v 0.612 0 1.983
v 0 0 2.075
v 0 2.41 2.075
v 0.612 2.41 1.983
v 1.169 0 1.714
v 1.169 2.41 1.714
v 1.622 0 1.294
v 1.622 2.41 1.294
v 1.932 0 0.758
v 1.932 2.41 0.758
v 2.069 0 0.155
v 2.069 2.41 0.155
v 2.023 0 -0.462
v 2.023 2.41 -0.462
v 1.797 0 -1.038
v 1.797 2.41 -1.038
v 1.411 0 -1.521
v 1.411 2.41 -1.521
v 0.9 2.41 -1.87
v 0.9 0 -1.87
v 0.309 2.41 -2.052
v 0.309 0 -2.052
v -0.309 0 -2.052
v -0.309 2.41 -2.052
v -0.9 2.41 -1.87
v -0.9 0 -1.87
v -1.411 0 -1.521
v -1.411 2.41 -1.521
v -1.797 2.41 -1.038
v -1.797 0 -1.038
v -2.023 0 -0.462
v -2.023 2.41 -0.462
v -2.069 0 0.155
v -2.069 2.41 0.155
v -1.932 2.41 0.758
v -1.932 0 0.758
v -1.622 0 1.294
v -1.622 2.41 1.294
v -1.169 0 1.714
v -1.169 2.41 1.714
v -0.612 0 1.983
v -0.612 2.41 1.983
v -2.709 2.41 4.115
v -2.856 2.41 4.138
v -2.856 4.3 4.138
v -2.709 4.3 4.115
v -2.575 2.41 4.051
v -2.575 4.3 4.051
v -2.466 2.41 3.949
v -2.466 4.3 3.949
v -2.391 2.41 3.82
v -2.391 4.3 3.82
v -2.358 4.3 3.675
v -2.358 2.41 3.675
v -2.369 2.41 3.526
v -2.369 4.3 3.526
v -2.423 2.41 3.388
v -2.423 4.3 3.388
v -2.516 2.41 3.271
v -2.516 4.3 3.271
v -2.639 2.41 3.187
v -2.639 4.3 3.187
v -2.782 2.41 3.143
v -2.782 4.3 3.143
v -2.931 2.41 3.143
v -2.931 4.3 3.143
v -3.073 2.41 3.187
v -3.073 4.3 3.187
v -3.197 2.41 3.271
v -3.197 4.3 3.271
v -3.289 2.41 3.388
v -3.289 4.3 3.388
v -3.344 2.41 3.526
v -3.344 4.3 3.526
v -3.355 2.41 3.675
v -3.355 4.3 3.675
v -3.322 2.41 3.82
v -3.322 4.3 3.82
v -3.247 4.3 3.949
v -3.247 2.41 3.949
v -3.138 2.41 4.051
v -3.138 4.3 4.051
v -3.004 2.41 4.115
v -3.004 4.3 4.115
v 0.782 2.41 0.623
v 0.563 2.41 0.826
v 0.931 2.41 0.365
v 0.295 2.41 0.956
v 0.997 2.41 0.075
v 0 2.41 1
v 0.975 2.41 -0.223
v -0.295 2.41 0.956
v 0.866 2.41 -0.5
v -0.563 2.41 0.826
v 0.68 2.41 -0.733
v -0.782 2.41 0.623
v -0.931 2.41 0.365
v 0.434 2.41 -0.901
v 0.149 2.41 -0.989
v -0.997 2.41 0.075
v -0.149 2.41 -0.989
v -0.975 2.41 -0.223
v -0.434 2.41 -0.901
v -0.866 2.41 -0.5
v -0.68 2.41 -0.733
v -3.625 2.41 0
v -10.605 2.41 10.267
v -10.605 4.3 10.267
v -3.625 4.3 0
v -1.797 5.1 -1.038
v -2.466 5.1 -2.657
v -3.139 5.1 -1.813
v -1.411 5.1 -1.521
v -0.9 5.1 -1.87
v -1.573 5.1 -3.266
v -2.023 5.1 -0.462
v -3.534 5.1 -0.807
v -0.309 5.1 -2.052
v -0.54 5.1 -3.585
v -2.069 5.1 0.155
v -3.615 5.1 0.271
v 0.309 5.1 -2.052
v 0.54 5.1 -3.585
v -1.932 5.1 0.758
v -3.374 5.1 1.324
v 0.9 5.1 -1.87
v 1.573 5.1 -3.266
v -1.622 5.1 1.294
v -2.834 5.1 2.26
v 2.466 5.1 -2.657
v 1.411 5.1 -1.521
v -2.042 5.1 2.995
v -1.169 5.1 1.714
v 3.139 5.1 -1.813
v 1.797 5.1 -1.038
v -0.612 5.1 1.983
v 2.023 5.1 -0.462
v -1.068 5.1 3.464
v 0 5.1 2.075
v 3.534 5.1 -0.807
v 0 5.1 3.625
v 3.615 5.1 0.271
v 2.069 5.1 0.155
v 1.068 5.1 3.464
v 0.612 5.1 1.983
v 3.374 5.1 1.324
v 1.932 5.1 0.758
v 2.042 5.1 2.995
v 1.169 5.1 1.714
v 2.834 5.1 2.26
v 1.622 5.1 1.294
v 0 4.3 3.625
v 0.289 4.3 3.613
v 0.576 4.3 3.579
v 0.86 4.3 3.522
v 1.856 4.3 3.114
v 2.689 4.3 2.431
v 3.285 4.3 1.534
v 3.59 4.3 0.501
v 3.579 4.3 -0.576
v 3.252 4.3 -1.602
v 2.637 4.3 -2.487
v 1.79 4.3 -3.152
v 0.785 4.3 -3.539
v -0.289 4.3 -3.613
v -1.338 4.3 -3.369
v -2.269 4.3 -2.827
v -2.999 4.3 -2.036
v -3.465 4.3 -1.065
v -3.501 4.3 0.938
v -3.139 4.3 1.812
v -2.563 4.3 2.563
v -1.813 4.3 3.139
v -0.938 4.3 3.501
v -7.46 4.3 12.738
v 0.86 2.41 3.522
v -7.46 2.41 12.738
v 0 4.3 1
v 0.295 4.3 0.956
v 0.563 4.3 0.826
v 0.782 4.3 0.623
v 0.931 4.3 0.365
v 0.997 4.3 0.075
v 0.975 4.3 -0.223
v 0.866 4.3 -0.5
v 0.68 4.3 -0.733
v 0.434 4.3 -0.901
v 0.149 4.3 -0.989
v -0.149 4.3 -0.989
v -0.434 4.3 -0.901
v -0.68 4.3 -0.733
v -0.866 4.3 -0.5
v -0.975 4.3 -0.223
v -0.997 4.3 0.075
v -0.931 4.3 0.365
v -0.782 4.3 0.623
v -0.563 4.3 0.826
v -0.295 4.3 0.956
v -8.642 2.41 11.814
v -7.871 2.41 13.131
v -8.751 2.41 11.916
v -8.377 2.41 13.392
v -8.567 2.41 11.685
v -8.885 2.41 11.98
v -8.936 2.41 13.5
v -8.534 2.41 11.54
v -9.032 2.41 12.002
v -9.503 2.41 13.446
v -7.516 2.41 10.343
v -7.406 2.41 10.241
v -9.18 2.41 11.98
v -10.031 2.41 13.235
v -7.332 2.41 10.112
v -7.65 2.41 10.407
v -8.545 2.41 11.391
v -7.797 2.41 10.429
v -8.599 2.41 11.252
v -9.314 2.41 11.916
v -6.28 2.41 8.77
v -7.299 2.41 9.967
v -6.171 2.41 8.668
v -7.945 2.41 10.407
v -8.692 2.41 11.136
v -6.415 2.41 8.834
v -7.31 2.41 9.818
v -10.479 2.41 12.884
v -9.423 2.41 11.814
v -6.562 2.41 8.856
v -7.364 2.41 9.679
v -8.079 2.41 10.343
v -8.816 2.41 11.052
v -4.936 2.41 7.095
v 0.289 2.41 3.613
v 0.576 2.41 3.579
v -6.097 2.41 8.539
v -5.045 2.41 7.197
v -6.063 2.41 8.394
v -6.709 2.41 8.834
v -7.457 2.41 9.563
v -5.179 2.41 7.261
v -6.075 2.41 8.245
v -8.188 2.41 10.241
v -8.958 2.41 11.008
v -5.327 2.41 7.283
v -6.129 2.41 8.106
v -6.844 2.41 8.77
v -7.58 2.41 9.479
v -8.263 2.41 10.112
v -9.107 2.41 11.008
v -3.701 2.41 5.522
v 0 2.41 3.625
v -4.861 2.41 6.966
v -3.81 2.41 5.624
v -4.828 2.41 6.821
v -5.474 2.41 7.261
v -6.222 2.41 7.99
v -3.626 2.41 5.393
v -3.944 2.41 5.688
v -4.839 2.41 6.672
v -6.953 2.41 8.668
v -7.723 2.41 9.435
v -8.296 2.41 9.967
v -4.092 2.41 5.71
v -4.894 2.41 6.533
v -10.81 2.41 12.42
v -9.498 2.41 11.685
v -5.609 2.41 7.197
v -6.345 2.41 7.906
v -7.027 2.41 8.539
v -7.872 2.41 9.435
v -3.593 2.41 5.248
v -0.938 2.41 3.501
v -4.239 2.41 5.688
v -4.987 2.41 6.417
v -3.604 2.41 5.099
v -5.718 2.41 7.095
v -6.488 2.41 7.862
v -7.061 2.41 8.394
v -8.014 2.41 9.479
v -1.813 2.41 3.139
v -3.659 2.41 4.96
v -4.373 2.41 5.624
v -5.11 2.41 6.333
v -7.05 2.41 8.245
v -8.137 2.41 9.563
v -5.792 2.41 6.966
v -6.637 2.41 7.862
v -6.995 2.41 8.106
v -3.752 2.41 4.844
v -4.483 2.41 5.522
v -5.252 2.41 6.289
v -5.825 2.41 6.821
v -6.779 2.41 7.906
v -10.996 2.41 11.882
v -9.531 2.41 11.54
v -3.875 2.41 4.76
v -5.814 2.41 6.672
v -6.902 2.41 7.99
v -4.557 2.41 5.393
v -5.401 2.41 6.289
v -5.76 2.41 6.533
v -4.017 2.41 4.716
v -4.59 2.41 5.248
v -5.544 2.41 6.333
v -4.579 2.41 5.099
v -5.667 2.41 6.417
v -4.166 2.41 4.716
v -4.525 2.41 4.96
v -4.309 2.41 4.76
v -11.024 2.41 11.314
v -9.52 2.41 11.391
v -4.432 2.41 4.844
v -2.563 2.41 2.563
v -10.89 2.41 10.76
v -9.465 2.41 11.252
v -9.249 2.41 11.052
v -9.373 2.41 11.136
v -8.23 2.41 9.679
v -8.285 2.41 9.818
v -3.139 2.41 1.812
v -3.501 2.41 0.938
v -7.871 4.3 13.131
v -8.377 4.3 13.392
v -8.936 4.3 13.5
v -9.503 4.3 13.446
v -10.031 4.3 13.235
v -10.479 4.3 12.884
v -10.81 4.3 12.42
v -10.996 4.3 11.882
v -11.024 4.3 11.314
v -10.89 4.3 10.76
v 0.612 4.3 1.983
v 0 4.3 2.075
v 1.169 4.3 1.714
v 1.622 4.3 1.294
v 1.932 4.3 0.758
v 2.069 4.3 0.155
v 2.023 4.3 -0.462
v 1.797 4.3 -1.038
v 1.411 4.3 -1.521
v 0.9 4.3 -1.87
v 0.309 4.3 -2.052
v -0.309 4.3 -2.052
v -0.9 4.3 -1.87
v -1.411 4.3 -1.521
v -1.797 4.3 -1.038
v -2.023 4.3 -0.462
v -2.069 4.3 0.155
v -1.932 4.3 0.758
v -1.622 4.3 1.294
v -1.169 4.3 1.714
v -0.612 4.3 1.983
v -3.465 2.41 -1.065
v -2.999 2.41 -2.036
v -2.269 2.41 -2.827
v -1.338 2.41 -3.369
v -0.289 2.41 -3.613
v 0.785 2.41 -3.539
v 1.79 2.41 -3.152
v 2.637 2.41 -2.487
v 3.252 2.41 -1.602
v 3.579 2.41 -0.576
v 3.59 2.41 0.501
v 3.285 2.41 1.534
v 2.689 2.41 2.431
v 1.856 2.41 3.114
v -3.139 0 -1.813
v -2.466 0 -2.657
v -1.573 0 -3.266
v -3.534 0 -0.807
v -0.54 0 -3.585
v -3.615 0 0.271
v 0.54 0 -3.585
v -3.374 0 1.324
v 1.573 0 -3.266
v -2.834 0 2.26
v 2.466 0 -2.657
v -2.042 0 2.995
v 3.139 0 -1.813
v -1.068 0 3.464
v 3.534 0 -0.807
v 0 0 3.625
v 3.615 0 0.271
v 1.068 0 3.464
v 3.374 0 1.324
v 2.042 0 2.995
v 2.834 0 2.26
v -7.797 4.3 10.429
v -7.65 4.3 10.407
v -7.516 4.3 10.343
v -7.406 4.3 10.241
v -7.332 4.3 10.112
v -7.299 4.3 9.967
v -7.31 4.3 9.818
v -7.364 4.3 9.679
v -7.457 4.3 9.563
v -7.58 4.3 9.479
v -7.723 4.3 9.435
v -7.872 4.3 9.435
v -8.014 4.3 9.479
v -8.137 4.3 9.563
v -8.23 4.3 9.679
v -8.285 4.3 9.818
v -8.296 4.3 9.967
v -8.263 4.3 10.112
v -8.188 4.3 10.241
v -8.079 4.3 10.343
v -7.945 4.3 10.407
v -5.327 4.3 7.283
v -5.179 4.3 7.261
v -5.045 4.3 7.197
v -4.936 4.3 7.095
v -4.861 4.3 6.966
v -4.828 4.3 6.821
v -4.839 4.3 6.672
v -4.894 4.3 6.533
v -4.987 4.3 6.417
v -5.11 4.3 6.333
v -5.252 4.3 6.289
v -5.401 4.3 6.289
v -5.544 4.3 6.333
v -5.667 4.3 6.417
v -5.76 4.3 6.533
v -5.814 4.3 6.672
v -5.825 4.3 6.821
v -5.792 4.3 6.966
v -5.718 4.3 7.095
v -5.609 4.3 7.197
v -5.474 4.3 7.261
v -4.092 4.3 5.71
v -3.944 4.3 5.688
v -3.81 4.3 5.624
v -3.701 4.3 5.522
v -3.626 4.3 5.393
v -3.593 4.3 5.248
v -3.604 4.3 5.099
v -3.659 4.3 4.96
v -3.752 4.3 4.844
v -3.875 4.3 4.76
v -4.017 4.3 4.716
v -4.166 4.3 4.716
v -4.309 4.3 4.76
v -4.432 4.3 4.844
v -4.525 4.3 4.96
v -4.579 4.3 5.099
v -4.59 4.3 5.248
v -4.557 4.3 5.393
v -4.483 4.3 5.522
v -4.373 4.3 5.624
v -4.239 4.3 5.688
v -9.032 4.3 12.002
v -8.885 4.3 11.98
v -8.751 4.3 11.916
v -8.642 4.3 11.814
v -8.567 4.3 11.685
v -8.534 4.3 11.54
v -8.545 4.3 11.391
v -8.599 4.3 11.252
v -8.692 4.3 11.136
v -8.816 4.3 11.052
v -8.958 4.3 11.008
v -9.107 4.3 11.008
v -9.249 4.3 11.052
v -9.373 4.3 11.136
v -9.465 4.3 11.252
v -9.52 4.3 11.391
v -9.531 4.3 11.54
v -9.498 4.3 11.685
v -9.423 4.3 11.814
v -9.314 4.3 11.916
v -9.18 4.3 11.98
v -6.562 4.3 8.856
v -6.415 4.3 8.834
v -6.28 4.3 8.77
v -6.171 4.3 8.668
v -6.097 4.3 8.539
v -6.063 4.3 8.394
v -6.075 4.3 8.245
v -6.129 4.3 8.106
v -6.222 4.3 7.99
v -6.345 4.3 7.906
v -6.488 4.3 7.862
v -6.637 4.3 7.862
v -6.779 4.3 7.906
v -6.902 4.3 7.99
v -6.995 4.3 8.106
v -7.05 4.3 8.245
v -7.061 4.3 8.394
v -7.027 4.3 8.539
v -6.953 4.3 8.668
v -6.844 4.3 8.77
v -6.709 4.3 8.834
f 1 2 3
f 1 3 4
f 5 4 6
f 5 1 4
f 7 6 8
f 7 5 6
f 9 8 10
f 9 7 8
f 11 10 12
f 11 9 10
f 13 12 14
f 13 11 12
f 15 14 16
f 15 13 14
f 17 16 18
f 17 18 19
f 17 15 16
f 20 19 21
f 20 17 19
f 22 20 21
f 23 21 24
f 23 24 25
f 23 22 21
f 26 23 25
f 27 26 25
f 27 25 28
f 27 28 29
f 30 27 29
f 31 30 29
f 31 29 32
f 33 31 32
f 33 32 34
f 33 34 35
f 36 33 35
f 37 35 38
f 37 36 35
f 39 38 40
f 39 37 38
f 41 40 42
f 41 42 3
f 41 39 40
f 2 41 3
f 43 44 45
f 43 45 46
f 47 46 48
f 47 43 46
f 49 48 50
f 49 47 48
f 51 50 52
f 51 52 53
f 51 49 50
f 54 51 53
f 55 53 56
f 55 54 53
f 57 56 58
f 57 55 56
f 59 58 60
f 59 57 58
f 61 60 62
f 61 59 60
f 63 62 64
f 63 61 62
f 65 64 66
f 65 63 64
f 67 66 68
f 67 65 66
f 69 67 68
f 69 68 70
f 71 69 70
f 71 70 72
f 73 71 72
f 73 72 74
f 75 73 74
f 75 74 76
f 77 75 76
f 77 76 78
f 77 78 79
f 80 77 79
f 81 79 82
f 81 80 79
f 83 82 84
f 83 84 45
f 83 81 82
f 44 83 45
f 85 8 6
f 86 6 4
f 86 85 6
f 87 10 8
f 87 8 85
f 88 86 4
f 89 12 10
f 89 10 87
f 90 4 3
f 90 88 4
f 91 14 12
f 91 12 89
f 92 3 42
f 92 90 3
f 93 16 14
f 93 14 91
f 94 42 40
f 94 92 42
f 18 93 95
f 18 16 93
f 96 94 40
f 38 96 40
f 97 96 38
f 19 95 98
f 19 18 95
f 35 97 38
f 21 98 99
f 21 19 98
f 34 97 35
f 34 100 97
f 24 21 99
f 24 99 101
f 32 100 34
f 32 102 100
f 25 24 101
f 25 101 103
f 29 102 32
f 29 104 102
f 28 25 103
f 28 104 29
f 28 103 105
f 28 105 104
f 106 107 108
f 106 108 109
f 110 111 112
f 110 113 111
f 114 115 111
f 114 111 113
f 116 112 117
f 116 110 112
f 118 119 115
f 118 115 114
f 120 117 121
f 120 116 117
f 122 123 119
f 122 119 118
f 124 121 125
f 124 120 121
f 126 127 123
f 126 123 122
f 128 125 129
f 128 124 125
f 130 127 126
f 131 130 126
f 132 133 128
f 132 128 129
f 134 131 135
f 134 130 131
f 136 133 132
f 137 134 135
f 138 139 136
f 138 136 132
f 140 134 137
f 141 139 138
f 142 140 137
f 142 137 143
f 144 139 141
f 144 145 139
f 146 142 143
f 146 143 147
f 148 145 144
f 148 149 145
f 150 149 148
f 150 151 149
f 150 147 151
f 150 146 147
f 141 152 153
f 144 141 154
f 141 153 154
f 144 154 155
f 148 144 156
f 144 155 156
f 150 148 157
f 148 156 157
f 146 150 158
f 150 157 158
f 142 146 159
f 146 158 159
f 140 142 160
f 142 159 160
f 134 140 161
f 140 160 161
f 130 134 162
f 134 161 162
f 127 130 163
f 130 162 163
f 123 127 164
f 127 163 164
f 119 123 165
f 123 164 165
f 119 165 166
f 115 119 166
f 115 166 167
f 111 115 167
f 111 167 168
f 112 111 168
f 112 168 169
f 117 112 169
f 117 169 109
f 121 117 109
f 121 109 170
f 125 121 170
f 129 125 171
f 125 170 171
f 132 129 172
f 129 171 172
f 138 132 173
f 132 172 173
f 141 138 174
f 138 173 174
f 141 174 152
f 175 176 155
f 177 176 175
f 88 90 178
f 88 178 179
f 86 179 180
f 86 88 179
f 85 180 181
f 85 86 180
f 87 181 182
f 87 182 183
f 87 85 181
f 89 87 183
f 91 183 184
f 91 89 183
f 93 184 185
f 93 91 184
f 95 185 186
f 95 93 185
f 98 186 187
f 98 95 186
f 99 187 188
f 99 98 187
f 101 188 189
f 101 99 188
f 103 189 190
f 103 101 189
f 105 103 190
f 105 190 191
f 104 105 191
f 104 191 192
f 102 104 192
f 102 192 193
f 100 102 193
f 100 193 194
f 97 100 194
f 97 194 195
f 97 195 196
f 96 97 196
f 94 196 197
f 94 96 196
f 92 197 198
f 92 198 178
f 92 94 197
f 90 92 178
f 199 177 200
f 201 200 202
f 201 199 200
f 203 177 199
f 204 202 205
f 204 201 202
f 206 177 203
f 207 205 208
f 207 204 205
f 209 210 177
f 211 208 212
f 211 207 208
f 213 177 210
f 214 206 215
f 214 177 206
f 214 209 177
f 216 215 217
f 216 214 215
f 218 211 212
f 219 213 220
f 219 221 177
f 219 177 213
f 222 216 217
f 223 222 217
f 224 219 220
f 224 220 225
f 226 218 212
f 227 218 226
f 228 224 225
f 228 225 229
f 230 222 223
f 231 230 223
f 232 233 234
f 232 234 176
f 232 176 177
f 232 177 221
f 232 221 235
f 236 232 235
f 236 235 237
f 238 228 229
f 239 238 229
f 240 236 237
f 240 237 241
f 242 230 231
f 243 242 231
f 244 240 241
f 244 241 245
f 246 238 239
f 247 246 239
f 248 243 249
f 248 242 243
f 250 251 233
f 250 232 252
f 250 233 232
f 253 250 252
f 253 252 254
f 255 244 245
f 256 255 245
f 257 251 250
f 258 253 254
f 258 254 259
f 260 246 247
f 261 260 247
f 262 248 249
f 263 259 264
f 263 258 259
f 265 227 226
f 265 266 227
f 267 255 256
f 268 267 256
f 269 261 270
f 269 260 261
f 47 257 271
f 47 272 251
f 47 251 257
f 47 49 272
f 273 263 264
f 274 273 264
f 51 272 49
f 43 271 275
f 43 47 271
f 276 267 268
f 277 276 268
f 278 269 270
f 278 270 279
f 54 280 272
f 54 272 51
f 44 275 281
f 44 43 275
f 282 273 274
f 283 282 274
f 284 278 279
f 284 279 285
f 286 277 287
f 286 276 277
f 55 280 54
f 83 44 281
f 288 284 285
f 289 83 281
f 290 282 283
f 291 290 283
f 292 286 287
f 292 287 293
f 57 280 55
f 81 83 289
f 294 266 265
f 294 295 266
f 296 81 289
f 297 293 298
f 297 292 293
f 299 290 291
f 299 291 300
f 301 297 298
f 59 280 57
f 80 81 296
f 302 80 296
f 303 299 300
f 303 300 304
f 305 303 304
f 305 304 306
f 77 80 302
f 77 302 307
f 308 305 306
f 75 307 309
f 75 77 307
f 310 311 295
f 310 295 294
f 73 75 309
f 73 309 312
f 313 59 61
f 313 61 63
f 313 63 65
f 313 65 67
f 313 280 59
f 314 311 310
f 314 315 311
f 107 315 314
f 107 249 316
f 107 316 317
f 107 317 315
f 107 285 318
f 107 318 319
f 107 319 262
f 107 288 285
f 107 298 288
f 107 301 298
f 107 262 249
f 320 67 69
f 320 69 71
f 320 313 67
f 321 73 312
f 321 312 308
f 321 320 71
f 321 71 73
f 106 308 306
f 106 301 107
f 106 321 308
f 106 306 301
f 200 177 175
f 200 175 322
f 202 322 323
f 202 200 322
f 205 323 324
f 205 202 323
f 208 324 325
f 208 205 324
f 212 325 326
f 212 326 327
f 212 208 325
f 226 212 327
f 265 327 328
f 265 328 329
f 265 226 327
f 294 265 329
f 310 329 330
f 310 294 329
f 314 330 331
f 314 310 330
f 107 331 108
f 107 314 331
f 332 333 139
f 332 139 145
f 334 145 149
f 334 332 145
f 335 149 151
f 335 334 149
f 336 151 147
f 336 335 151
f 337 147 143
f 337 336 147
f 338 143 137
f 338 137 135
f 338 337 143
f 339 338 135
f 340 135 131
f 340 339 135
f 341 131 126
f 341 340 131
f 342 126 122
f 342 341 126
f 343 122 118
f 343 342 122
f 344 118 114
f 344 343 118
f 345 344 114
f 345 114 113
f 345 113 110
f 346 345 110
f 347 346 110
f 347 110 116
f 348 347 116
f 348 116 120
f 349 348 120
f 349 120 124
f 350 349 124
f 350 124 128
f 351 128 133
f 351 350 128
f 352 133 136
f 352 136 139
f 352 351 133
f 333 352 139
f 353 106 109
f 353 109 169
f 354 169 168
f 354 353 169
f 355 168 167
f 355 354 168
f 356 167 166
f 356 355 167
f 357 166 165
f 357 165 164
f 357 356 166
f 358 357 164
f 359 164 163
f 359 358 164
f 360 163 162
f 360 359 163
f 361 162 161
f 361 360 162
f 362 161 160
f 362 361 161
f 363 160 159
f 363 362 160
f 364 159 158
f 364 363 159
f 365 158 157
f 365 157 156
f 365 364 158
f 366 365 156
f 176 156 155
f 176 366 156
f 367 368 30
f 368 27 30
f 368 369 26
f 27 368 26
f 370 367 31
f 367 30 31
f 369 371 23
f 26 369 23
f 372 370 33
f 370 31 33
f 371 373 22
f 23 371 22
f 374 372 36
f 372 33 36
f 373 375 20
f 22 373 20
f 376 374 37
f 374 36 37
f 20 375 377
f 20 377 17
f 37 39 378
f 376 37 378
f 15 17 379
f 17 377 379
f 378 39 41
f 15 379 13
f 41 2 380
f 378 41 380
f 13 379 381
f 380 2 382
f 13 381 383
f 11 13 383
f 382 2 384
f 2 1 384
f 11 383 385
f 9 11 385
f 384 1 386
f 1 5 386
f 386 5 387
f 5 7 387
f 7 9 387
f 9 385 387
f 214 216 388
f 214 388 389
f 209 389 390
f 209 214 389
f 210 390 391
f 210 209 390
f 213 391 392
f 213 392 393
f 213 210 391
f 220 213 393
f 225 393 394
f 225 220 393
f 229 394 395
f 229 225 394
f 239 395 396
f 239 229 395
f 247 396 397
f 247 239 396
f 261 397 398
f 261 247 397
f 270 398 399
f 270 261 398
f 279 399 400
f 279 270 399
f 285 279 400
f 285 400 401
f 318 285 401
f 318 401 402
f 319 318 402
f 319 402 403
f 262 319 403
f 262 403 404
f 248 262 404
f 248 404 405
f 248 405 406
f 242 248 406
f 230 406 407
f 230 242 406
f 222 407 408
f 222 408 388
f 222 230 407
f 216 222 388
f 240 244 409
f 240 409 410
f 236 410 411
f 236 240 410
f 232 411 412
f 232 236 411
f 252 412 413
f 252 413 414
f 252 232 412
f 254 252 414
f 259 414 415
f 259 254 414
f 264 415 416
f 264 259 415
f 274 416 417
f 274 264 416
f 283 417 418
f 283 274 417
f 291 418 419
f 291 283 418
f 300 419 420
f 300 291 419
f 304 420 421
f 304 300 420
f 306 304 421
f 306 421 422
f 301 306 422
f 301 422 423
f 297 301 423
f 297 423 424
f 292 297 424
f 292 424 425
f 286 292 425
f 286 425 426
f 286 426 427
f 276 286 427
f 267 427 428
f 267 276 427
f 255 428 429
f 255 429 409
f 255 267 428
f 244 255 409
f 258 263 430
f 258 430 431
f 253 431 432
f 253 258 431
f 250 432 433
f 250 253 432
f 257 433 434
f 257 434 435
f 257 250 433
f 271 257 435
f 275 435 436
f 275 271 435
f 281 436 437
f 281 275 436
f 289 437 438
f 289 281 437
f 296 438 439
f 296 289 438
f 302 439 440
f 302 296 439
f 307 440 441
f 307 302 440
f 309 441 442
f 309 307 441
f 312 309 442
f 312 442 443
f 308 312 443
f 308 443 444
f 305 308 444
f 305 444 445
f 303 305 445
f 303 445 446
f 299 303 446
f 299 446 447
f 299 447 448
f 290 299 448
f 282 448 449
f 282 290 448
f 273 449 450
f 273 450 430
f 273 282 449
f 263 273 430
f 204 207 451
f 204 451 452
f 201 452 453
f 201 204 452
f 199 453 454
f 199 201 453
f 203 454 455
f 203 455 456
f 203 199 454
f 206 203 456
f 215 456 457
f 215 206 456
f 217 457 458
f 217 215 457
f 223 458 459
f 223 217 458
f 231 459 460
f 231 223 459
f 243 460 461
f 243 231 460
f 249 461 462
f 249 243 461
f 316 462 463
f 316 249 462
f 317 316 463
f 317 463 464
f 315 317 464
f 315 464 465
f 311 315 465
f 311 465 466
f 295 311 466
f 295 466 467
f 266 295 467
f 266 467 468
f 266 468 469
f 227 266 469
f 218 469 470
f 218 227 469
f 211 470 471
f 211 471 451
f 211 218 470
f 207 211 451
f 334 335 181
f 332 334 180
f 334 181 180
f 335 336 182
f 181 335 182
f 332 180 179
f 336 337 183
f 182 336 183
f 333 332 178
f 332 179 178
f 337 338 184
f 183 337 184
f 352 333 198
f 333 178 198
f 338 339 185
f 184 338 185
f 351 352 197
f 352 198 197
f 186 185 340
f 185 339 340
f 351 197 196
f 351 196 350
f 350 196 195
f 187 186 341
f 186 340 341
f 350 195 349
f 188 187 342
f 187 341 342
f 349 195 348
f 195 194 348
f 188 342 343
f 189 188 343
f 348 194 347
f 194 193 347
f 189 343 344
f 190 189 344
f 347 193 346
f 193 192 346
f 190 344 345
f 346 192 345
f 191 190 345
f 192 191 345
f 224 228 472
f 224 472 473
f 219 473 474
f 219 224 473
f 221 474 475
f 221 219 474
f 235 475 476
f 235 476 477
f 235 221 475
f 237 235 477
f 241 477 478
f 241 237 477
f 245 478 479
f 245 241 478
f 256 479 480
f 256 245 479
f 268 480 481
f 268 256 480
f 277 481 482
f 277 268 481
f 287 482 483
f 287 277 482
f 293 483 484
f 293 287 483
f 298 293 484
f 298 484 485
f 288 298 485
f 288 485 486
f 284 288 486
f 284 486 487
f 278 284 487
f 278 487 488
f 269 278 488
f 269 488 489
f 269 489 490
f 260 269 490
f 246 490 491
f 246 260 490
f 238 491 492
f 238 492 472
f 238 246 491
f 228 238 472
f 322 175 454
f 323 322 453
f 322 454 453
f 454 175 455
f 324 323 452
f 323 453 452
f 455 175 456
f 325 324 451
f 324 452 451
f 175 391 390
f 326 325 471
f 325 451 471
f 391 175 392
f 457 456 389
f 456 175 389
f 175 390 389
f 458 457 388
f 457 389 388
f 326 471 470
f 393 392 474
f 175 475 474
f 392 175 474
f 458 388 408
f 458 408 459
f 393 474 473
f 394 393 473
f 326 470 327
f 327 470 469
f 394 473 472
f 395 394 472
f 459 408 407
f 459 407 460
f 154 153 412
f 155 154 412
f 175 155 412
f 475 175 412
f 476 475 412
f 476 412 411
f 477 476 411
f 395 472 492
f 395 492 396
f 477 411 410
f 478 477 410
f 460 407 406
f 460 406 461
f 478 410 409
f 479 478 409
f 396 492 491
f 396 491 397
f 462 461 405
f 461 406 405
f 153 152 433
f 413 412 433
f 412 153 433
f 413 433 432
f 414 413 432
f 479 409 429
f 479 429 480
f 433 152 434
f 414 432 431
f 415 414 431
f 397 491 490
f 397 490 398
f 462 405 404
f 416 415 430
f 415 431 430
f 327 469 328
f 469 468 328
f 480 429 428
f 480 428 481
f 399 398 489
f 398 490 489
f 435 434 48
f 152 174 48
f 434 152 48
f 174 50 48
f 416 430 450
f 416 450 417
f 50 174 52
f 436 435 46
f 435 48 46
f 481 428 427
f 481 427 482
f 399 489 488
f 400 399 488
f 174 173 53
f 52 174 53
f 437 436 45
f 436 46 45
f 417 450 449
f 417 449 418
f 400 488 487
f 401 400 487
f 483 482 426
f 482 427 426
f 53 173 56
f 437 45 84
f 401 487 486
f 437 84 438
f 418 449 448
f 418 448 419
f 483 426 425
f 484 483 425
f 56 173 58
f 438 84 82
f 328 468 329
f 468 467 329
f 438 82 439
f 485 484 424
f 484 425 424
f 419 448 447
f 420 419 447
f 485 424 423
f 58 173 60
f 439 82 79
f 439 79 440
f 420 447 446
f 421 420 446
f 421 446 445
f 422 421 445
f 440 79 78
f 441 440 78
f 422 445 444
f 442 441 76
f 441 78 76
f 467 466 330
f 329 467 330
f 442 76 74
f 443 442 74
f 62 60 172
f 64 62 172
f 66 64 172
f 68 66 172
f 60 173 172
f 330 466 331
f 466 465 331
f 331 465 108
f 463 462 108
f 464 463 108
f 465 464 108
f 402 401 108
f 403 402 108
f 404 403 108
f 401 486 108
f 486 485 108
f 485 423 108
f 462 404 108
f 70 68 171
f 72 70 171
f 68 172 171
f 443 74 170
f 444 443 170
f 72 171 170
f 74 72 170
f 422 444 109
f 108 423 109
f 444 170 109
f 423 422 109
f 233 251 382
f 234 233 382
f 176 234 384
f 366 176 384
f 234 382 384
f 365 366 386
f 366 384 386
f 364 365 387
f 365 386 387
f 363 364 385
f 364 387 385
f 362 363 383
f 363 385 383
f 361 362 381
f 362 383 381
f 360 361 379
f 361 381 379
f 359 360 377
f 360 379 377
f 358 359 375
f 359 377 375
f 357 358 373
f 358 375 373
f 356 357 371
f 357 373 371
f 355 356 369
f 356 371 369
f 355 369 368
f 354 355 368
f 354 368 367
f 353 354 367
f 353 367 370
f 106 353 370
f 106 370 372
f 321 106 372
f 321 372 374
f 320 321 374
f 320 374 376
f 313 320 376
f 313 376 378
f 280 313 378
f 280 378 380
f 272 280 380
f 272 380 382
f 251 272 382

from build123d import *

# Parameters (mm, degrees)
SKETCH1_R           = 3.625
SKETCH1_R_2         = 2.075
BOSS_EXTRUDE1_DEPTH = 2.41
SKETCH2_R           = 1
SKETCH2_R_2         = 0.5
BOSS_EXTRUDE3_DEPTH = 1.89
BOSS_EXTRUDE4_START = 4.3
SKETCH1_2_R         = 3.625
SKETCH1_2_R_2       = 2.075
BOSS_EXTRUDE4_DEPTH = 0.8


with BuildPart() as part:
    # Sketch1 → Boss-Extrude1 (new body)
    with BuildSketch(Plane(origin=(0, 0, 0), x_dir=(1, 0, 0), z_dir=(0, 1, 0))):
        with Locations(Location((0, 0, 0), (0, 0, 270))):
            Circle(SKETCH1_R)
        with Locations(Location((0, 0, 0), (0, 0, 270))):
            Circle(SKETCH1_R_2, mode=Mode.SUBTRACT)
    extrude(amount=BOSS_EXTRUDE1_DEPTH)

    # Sketch2 → Boss-Extrude3 (add)
    with BuildSketch(Plane(origin=(0, 2.41, 0), x_dir=(1, 0, 0), z_dir=(0, 1, 0))):
        with BuildLine():
            Line((-10.6054557, -10.267177528), (-3.625, 0))
            ThreePointArc((-3.625, 0), (2.238819707, 2.851019347), (0.859585555, -3.521610097))
            Line((0.859585555, -3.521610097), (-7.459503317, -12.737599274))
            ThreePointArc((-7.459503317, -12.737599274), (-10.267690381, -13.075364593), (-10.6054557, -10.267177528))
        make_face()
        with Locations(Location((0, 0, 0), (0, 0, 270))):
            Circle(SKETCH2_R, mode=Mode.SUBTRACT)
        with Locations(Location((-9.032479508, -11.502388401, 0), (0, 0, 270))):
            Circle(SKETCH2_R_2, mode=Mode.SUBTRACT)
        with Locations(Location((-7.797268635, -9.92941221, 0), (0, 0, 270))):
            Circle(SKETCH2_R_2, mode=Mode.SUBTRACT)
        with Locations(Location((-6.562057762, -8.356436018, 0), (0, 0, 270))):
            Circle(SKETCH2_R_2, mode=Mode.SUBTRACT)
        with Locations(Location((-5.32684689, -6.783459826, 0), (0, 0, 270))):
            Circle(SKETCH2_R_2, mode=Mode.SUBTRACT)
        with Locations(Location((-4.091636017, -5.210483635, 0), (0, 0, 270))):
            Circle(SKETCH2_R_2, mode=Mode.SUBTRACT)
        with Locations(Location((-2.856425144, -3.637507443, 0), (0, 0, 270))):
            Circle(SKETCH2_R_2, mode=Mode.SUBTRACT)
    extrude(amount=BOSS_EXTRUDE3_DEPTH)

    # Sketch1<2> → Boss-Extrude4 (add)
    with BuildSketch(Plane(origin=(0, 0, 0), x_dir=(1, 0, 0), z_dir=(0, 1, 0)).offset(BOSS_EXTRUDE4_START)):
        with Locations(Location((0, 0, 0), (0, 0, 270))):
            Circle(SKETCH1_2_R)
        with Locations(Location((0, 0, 0), (0, 0, 270))):
            Circle(SKETCH1_2_R_2, mode=Mode.SUBTRACT)
    extrude(amount=BOSS_EXTRUDE4_DEPTH)


solid = part.part
